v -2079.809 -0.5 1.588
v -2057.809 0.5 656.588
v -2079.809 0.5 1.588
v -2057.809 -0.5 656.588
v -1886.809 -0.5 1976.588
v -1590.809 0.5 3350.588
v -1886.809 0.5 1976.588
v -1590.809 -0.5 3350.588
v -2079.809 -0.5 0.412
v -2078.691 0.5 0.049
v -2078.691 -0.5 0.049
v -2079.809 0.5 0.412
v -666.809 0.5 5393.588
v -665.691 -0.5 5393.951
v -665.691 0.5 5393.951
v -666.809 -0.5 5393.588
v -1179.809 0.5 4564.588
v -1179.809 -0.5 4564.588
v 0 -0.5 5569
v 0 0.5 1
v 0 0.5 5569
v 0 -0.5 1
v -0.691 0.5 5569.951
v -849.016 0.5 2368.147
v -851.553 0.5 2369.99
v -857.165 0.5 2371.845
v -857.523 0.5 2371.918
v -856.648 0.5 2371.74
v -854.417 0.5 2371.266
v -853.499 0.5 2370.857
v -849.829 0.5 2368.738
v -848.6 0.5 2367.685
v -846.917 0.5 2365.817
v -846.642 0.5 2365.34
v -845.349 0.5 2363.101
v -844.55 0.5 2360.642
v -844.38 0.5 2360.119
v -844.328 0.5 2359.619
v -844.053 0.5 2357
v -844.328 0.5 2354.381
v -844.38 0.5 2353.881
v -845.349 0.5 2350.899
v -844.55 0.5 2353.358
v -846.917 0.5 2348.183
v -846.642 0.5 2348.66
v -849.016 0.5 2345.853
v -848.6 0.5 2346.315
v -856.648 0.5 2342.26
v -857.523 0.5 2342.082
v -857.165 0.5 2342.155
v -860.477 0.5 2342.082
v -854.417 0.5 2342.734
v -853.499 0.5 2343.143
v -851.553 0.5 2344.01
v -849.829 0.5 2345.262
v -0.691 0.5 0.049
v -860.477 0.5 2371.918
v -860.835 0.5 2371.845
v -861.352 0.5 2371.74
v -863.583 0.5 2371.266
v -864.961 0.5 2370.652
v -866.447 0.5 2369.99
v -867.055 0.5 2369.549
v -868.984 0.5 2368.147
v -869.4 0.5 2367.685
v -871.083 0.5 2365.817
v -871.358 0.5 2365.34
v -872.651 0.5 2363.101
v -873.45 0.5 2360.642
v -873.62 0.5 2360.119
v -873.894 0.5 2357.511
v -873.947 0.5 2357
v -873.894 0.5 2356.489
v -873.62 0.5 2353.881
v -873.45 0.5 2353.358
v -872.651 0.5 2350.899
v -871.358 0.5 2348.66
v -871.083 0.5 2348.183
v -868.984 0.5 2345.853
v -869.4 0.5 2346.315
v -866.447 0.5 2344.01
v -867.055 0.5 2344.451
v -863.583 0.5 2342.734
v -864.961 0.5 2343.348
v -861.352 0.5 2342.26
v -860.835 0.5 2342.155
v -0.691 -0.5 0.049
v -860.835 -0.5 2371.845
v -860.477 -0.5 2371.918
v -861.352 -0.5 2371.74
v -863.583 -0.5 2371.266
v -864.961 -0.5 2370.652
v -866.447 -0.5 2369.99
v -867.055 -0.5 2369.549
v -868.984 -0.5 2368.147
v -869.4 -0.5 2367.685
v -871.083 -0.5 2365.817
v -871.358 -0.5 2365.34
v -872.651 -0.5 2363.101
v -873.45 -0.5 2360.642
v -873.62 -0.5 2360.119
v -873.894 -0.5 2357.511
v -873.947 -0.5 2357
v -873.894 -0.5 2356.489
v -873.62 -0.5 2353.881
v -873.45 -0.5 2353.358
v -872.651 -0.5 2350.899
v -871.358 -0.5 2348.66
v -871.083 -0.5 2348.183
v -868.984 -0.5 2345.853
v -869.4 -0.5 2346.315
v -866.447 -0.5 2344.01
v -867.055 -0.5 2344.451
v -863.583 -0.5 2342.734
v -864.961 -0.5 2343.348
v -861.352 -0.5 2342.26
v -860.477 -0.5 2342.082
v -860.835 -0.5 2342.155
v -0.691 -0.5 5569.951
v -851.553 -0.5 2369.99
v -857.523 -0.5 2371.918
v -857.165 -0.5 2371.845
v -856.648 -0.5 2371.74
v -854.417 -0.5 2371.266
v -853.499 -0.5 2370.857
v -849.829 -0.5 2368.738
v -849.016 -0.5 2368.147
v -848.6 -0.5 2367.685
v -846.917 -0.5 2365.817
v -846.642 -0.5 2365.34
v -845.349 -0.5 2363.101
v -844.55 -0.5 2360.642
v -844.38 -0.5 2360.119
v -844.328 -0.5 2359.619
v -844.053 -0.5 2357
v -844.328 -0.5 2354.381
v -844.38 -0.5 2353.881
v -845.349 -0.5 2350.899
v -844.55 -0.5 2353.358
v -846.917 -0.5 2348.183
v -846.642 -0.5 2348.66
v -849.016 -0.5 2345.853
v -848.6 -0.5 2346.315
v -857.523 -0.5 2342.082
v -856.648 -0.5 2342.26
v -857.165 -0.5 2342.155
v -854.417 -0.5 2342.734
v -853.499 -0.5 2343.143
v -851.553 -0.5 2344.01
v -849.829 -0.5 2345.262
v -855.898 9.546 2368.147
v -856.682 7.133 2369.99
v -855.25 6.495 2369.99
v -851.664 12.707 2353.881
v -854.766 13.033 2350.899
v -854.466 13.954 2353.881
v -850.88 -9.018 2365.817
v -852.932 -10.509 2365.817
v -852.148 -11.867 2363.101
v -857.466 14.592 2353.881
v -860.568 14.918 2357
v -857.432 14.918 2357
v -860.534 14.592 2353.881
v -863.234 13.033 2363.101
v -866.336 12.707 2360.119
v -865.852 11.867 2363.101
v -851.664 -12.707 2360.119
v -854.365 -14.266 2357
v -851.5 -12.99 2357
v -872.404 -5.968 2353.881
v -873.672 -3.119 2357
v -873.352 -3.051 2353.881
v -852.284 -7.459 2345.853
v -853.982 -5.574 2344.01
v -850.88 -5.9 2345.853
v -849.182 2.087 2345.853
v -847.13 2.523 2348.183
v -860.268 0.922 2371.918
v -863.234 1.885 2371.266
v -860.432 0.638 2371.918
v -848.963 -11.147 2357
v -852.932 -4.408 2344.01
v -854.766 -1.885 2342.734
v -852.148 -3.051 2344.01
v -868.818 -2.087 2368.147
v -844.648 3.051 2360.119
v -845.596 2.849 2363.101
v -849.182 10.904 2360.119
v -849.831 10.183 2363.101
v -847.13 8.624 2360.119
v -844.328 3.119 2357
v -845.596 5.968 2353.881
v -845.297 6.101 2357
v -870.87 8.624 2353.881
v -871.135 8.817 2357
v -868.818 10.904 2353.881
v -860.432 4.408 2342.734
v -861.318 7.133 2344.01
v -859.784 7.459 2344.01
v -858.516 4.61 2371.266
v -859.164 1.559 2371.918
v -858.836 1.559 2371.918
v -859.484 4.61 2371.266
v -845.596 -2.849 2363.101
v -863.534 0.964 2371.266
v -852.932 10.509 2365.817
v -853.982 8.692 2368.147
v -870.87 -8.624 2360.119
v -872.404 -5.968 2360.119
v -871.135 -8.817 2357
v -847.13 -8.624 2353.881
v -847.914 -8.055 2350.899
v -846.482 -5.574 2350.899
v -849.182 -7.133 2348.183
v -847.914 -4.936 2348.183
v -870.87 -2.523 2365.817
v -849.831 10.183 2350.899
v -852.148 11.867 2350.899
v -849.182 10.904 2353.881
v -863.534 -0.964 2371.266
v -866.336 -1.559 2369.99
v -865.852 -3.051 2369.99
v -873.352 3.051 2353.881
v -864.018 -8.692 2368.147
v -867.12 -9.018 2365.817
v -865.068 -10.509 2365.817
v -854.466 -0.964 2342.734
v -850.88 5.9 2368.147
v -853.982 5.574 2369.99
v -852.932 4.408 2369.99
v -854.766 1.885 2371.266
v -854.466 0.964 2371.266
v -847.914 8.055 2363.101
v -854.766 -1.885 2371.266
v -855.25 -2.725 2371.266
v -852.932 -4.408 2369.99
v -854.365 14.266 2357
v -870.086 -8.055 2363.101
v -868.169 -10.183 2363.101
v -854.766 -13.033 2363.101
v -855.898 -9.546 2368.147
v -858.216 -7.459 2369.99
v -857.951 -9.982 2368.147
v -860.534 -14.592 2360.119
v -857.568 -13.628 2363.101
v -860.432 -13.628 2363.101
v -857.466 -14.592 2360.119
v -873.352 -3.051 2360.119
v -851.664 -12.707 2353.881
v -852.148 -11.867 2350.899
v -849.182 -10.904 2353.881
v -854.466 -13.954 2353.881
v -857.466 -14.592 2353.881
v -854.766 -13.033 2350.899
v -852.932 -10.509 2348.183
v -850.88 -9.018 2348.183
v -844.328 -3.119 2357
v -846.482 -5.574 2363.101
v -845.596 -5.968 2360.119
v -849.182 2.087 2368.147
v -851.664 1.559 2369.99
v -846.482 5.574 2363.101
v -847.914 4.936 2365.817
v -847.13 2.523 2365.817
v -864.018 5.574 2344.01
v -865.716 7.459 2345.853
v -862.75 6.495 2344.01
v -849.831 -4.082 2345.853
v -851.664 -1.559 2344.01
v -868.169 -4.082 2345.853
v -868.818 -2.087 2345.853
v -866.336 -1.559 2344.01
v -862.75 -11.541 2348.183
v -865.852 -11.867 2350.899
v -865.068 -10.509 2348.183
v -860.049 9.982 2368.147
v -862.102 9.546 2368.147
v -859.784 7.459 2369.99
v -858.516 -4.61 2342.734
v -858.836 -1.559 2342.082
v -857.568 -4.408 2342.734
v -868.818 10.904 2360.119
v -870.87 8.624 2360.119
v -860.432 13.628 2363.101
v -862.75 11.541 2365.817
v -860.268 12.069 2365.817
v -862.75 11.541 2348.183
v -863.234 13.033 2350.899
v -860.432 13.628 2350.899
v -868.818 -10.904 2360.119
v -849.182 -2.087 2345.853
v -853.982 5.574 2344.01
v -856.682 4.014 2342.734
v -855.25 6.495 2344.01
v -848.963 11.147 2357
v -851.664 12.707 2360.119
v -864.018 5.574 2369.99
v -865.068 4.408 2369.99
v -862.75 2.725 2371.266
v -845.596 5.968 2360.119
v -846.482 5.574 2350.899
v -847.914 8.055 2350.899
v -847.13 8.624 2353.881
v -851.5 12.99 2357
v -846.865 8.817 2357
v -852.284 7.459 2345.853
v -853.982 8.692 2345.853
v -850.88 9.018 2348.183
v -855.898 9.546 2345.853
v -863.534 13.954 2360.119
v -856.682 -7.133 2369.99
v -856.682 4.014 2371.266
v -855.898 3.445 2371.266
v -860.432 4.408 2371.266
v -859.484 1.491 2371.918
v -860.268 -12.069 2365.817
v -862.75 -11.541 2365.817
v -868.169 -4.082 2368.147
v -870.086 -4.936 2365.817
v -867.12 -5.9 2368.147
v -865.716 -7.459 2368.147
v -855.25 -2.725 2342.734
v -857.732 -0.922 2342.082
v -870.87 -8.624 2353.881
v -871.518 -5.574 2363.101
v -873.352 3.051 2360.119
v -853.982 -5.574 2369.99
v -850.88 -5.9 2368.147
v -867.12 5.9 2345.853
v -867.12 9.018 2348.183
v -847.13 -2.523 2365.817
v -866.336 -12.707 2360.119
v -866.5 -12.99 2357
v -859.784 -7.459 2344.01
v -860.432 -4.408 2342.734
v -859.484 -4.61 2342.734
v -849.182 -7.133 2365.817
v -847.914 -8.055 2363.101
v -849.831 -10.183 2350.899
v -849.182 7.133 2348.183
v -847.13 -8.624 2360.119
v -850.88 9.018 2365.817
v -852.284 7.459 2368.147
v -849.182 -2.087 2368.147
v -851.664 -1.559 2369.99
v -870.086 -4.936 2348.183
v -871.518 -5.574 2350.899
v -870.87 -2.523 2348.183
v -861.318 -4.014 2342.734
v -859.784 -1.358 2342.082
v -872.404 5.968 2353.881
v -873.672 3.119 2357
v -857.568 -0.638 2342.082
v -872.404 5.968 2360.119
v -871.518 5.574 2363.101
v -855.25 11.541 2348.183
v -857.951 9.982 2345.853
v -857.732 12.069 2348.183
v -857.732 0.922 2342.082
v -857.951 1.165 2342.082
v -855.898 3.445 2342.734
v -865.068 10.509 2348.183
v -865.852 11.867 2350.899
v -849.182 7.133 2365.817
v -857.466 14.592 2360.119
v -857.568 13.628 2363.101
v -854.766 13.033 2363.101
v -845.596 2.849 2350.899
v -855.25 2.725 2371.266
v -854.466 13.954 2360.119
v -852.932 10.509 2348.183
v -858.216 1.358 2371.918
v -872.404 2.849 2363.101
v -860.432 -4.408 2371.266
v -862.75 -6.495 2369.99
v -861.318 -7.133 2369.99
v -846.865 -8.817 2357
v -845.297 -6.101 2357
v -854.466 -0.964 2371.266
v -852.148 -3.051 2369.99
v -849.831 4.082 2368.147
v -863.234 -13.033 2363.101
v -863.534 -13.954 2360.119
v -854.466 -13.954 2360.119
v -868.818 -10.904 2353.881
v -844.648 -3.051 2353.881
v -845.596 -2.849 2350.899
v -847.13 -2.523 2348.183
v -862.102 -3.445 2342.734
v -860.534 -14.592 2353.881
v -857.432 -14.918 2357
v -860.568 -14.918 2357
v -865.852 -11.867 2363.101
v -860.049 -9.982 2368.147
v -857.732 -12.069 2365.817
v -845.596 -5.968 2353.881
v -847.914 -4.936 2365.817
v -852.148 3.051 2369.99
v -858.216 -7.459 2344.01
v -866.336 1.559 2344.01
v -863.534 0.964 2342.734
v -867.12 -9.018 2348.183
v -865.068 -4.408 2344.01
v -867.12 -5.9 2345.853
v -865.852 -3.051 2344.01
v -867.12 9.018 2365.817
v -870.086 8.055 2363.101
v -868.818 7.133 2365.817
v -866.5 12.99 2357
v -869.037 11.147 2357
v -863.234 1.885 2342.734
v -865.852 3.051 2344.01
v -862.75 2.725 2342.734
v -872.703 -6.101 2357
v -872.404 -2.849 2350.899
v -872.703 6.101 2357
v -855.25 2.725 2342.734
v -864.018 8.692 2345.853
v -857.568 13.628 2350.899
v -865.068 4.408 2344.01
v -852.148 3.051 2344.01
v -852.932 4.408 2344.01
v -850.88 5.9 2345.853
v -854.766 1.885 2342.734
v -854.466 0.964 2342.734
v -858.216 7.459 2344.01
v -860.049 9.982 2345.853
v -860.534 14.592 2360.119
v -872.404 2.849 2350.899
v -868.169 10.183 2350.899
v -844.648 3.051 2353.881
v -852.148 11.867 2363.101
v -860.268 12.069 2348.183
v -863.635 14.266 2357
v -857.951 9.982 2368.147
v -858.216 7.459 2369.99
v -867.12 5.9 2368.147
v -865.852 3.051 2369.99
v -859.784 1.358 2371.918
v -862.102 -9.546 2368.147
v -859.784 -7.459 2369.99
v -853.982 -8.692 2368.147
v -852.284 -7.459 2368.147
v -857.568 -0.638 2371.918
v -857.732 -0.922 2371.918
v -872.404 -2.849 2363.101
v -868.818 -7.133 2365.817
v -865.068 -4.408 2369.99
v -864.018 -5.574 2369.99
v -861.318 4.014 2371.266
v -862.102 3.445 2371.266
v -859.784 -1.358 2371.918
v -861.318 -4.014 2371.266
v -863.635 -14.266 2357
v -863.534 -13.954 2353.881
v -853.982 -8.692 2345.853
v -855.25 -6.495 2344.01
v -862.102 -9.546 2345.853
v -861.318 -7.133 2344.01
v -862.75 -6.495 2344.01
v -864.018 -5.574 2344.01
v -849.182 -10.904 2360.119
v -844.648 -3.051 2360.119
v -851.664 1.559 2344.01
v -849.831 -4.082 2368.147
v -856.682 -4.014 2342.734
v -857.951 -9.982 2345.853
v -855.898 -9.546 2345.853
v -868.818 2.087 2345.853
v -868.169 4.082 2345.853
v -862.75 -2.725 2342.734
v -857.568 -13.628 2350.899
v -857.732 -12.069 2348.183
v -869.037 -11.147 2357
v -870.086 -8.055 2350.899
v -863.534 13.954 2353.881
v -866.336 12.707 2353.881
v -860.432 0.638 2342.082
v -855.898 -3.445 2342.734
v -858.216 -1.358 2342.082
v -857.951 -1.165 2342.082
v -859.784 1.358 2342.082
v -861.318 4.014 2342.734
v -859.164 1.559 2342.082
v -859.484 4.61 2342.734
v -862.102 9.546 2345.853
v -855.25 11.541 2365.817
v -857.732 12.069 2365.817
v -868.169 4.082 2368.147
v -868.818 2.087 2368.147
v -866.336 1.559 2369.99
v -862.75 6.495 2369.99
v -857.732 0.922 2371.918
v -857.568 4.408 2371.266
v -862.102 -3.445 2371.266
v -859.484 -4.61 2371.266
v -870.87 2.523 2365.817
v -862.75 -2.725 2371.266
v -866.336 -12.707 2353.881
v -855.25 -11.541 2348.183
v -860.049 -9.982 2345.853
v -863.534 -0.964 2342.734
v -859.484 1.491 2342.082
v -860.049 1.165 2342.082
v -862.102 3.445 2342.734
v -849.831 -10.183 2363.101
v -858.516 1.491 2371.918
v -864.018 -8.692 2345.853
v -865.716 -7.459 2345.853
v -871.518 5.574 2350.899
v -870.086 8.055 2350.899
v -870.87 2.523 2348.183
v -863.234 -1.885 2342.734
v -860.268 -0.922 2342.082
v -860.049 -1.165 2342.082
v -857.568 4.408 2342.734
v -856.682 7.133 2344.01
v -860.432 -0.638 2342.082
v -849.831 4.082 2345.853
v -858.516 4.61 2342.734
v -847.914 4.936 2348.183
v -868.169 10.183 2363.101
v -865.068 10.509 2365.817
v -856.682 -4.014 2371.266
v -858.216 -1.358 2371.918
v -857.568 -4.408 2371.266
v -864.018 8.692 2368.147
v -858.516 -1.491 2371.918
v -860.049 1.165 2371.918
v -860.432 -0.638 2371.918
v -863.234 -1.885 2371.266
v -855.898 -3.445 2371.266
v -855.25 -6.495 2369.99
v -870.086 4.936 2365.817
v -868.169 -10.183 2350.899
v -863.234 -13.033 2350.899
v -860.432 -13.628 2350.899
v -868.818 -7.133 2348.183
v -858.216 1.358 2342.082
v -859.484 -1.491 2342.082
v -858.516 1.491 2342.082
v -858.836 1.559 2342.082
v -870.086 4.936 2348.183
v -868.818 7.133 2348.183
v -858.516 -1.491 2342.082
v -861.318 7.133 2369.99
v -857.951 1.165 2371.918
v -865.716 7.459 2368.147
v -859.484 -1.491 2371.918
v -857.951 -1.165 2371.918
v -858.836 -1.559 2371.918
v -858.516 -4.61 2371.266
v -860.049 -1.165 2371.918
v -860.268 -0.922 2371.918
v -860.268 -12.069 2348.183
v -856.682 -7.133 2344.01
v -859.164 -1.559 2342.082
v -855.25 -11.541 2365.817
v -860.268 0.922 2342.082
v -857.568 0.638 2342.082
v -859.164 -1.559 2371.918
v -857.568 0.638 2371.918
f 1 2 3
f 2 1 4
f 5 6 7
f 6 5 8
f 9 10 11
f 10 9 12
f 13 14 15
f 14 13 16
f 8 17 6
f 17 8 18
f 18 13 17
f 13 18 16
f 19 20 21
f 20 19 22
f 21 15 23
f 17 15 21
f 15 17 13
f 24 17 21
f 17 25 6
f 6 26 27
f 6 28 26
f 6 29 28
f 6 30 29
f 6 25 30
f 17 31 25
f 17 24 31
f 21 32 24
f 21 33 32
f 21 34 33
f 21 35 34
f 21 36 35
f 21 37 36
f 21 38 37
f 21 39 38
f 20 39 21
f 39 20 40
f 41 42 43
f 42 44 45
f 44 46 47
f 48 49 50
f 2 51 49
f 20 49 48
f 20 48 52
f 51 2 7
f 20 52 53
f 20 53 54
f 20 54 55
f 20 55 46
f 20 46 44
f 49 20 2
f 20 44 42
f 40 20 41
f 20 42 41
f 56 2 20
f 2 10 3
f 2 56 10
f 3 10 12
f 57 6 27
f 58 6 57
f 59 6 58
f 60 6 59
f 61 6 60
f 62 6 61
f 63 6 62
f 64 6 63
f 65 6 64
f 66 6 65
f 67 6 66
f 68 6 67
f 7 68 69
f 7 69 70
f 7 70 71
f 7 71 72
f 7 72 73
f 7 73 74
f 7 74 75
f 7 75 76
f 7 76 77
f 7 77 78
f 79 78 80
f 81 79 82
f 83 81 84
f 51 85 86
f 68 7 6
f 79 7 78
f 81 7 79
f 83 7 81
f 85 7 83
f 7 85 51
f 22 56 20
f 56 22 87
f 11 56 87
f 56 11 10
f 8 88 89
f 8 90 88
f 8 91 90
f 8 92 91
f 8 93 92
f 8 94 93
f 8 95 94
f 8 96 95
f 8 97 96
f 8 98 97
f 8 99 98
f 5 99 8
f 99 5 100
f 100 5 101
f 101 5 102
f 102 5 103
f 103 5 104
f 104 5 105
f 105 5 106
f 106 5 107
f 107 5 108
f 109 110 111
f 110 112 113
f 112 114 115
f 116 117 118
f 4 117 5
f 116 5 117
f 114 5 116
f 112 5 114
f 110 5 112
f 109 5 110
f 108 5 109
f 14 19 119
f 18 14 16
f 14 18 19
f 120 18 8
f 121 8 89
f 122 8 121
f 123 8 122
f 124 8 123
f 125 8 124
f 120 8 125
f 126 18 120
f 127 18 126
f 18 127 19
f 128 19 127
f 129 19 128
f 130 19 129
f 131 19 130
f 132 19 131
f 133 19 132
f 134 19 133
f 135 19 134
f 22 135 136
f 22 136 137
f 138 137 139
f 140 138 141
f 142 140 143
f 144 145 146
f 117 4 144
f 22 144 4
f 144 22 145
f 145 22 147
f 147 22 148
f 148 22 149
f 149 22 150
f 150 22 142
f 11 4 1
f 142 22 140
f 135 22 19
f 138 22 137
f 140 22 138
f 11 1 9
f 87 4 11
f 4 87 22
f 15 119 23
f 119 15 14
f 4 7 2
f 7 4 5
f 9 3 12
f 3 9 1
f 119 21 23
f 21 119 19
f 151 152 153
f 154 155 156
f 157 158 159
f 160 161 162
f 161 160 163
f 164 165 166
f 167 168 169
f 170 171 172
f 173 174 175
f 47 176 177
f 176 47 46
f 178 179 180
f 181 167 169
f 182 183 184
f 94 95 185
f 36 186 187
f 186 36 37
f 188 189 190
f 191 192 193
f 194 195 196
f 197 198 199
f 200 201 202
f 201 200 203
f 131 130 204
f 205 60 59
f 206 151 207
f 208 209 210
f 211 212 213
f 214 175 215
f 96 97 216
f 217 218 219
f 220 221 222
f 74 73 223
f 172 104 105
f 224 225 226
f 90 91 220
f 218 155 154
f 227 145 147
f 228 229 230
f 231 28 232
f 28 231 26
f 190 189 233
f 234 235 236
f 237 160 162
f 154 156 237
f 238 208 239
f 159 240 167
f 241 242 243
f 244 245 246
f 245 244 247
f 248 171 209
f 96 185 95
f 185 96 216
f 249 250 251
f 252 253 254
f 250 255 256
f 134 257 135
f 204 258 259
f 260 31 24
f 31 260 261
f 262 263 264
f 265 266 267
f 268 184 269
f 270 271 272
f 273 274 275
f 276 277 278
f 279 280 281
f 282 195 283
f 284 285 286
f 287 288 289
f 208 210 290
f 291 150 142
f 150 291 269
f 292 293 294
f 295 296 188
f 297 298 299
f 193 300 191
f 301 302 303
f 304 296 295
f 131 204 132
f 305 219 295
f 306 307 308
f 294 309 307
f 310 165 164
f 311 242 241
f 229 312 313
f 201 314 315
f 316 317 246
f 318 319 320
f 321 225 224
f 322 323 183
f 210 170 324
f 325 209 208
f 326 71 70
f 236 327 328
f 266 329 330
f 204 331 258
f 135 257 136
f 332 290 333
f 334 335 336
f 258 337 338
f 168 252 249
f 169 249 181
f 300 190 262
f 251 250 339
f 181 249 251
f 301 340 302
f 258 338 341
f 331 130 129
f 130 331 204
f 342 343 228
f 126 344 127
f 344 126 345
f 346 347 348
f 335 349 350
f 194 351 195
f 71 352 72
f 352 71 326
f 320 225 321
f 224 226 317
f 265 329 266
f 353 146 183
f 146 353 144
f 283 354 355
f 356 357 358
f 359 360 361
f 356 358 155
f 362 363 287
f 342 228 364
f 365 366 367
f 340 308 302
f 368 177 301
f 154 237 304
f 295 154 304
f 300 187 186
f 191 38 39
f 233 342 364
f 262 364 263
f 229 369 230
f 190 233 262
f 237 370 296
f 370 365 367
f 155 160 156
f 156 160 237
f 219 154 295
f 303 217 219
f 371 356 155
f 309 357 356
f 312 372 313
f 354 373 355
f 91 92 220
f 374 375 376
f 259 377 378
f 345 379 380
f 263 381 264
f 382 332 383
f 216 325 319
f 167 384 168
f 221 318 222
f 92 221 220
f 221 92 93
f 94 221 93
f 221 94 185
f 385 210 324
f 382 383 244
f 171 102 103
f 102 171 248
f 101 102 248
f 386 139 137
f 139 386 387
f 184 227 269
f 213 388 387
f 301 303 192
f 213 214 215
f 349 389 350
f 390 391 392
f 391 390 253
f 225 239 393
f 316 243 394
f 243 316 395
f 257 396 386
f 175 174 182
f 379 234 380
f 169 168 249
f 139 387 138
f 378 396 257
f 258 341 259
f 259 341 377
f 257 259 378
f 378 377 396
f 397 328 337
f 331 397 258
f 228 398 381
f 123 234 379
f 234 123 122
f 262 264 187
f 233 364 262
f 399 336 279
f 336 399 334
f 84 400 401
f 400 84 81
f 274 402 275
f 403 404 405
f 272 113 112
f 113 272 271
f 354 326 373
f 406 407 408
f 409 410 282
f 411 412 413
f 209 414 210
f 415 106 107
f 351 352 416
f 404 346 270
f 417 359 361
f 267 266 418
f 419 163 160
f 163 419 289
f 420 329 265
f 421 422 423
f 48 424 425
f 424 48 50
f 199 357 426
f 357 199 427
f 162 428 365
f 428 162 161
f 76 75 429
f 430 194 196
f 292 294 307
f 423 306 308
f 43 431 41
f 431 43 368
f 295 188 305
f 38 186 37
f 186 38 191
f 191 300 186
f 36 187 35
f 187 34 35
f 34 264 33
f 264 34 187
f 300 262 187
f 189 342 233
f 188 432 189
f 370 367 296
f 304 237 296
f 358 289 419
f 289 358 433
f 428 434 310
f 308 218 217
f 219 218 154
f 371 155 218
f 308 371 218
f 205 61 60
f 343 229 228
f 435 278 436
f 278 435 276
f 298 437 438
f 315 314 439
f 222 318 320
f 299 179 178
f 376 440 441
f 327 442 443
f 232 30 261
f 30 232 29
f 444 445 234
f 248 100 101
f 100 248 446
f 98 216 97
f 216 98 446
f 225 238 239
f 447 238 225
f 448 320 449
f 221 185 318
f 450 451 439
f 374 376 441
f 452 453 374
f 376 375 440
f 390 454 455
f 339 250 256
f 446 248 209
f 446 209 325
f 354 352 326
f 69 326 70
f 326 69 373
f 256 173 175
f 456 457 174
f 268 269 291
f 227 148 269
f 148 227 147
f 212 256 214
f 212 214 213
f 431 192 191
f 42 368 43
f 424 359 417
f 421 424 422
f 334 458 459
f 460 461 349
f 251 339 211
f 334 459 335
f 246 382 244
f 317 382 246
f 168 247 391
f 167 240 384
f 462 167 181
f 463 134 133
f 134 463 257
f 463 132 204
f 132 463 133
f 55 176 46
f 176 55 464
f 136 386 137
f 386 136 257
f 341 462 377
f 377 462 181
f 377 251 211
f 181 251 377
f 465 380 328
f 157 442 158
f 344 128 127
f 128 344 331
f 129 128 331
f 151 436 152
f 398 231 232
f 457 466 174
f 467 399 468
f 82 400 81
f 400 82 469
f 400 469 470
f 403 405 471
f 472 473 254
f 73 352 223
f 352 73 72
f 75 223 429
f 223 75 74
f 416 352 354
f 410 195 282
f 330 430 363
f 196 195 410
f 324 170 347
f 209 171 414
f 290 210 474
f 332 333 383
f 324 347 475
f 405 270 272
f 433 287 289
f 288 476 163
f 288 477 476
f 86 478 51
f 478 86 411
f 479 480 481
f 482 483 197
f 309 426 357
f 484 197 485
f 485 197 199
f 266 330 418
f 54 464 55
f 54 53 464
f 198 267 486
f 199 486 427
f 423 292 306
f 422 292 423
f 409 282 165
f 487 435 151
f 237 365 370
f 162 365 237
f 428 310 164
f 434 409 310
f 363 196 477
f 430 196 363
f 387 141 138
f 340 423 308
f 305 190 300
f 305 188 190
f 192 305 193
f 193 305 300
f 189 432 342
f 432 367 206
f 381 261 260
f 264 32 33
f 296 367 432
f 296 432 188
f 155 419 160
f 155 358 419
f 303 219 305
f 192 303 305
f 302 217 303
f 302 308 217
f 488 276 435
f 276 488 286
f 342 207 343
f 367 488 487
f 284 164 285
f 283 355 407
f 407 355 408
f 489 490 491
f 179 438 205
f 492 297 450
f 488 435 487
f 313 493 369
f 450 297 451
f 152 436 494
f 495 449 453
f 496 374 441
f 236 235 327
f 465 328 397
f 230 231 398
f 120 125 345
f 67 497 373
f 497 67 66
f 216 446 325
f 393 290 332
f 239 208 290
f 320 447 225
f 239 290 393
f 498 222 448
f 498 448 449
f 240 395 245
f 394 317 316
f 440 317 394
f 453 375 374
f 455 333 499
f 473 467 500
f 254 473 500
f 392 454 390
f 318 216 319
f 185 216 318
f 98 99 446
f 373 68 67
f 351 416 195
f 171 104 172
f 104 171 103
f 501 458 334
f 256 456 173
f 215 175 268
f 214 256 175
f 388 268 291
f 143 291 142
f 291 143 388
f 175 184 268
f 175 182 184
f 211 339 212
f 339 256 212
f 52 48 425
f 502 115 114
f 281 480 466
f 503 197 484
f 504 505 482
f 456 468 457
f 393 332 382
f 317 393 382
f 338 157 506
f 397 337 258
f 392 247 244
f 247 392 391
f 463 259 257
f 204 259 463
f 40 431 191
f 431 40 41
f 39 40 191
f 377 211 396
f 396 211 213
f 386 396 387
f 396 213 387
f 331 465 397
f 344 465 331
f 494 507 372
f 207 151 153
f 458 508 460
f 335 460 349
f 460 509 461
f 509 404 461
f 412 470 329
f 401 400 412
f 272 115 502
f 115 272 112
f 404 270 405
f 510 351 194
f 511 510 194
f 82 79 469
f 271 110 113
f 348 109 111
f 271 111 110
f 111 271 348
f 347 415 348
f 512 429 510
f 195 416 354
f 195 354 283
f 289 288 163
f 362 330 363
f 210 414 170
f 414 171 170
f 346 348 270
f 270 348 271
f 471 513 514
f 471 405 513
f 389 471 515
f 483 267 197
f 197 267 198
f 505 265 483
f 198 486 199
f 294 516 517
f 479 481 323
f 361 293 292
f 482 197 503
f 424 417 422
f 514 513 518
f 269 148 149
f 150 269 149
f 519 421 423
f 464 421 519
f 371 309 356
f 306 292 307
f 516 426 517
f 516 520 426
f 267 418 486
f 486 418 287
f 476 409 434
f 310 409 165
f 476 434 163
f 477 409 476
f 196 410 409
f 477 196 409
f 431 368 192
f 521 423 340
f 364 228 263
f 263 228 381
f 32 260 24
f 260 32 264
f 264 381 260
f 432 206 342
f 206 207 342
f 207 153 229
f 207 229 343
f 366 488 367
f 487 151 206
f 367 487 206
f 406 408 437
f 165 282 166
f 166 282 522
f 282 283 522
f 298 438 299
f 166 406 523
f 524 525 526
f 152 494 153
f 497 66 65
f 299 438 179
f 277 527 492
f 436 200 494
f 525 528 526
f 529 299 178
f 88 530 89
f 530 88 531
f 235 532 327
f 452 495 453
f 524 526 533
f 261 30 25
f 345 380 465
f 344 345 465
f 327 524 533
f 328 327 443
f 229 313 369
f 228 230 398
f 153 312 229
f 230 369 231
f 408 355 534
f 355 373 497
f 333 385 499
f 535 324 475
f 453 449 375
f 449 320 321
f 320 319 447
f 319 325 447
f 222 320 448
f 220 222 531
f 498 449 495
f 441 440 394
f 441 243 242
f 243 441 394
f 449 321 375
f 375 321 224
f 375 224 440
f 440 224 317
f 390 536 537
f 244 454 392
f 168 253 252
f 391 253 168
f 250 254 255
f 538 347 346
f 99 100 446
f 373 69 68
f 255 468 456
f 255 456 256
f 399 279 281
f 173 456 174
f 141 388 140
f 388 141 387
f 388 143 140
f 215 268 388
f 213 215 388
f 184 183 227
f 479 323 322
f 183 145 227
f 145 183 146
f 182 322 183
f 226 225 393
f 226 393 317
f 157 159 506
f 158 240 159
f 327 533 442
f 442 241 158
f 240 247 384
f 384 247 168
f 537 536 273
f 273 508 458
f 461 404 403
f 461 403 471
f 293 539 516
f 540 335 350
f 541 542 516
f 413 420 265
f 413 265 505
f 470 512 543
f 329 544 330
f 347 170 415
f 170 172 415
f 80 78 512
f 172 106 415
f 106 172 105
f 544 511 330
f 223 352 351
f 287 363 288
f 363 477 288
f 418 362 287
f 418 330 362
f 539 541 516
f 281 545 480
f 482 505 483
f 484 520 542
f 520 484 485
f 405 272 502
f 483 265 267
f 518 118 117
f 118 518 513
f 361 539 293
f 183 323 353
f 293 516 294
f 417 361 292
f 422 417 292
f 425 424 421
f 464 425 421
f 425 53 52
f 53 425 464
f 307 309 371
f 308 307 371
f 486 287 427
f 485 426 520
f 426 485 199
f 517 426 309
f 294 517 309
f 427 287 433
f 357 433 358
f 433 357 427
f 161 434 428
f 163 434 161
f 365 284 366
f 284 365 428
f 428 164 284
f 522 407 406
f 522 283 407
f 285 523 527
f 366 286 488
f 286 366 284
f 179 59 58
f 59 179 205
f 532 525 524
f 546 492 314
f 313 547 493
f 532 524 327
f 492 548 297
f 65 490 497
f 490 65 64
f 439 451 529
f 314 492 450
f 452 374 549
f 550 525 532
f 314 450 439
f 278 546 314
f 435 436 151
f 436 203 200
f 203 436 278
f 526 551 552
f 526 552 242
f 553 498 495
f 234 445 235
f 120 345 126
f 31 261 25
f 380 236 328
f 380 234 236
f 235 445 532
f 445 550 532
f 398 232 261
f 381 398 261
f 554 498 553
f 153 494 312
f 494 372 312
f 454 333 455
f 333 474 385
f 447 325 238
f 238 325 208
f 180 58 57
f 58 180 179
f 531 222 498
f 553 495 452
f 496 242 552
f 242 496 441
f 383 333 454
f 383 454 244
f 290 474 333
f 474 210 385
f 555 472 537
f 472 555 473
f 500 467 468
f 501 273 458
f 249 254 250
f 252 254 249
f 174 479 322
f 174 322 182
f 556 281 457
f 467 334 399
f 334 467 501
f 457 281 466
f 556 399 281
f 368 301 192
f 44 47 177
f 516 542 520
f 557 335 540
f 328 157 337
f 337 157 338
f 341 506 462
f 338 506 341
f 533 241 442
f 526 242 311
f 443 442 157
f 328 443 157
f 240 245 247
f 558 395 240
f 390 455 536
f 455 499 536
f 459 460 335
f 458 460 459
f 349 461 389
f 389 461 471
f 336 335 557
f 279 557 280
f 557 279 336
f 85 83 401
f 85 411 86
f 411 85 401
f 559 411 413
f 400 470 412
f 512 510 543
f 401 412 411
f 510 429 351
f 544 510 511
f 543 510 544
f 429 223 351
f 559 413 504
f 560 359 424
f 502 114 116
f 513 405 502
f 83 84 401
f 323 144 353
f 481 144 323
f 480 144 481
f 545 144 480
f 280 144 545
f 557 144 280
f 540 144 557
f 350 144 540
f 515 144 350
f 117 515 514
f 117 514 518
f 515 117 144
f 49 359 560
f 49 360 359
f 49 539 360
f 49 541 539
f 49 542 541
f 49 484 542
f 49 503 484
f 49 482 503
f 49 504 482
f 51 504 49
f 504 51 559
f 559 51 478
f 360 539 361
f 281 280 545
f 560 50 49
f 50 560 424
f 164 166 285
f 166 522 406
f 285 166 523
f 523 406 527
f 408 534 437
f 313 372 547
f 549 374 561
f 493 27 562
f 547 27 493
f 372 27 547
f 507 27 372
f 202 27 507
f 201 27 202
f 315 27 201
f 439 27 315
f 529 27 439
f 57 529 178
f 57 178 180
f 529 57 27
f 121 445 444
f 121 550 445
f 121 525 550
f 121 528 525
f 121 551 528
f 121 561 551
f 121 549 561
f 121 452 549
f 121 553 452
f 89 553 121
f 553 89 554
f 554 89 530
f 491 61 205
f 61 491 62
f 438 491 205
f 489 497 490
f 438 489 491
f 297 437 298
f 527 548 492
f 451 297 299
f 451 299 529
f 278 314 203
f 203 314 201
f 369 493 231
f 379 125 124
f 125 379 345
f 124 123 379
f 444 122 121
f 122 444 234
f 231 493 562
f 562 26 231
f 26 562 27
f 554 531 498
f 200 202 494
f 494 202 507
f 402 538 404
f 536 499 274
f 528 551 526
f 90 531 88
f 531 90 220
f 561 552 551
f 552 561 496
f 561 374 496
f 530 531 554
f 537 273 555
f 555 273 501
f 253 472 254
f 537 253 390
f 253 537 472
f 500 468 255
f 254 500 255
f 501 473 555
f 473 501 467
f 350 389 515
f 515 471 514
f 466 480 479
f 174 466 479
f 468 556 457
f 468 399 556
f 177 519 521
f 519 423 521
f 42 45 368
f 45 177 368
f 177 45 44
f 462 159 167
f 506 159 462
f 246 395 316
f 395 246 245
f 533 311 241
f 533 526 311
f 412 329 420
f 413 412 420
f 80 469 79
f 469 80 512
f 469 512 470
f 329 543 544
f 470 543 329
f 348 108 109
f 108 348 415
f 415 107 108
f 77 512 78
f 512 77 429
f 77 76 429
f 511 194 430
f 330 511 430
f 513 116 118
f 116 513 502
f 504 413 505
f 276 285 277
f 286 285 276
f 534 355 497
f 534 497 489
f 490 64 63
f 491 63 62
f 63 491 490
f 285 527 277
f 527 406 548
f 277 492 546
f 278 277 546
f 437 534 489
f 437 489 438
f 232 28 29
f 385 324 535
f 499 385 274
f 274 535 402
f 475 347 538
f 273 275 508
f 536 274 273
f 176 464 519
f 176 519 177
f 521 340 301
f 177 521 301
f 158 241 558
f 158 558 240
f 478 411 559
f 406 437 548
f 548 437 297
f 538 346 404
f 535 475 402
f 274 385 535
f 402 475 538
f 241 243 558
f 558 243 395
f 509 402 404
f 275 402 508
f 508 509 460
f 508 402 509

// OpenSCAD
r1 = 1;
wid = 1;


Grot();

module Grot(){

    hull() {
    
        //A0
        translate([ -1 , 0 , 1 ]) 
        rotate([ 90 , 0 , 0 ])
        cylinder( r = r1 , h = wid , center = true );

        //B0
        translate([ - 2079 , 0 , 1 ])  // 2080 по горизонтали
        rotate([ 90 , 0 , 0 ])
        cylinder( r = r1 , h = wid , center = true );
    

        //B1
        translate([ - 2057 , 0 , 656 ]) 
        rotate([ 90 , 0 , 0 ])
        cylinder( r = r1 , h = wid , center = true );


        //B2
        translate([ - 1886 , 0 , 1976 ]) 
        rotate([ 90 , 0 , 0 ])
        cylinder( r = r1 , h = wid , center = true );


        //B3
        translate([ - 1590 , 0 , 3350 ]) 
        rotate([ 90 , 0 , 0 ])
        cylinder( r = r1 , h = wid , center = true );


        //B4
        translate([ - 1179 , 0 , 4564 ]) 
        rotate([ 90 , 0 , 0 ])
        cylinder( r = r1 , h = wid , center = true );


        //B6
        translate([ - 666 , 0 , 5393 ]) 
        rotate([ 90 , 0 , 0 ])
        cylinder( r = r1 , h = wid , center = true );

        //B0
        translate([ - 1 , 0 , 5569 ])  // 5570 в высоту
        rotate([ 90 , 0 , 0 ])
        cylinder( r = r1 , h = wid , center = true );


    }    


    //CP
    translate([ - 859  , 0  , 2357  ])
    sphere(d = 30);
        

    //B0
    // Плоскость работы шкота
//    translate([ - 2079 , 0 , 0 ])  // 2080 по горизонтали
//    rotate([ 0 , -62.5 , 0 ])
//    cylinder( r = 1000 , h = 1, center = true );

}
